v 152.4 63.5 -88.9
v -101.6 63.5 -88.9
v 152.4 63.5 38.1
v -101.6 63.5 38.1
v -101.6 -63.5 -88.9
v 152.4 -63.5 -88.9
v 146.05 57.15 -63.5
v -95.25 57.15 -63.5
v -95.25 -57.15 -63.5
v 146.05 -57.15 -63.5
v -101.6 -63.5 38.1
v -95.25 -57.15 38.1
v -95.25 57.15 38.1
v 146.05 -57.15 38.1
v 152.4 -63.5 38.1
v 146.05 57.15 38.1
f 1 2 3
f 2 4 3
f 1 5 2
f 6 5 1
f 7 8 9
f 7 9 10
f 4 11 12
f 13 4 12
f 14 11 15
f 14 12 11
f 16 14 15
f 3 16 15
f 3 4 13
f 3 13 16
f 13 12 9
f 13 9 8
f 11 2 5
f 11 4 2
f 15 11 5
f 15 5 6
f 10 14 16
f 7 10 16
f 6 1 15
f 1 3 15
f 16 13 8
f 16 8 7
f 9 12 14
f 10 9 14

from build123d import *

# Parameters (mm, degrees)
F0_W      = 254
F0_H      = 127
F1_DEPTH  = 38.1
F1_FACE_W = 254
F1_FACE_H = 127
F2_DEPTH  = 88.9
F3_W      = 241.3
F3_H      = 114.3
F4_DEPTH  = 101.6


with BuildPart() as f1:
    # F0 (on Top) → F1 (new body)
    with BuildSketch(Plane.XY):
        with Locations((25.4, 0)):
            Rectangle(F0_W, F0_H)
    extrude(amount=F1_DEPTH)

    # F1_face (on face) + F0 (on Top) → F2 (join)
    with BuildSketch(Plane(origin=(25.4, 0, 0), x_dir=(1, 0, 0), z_dir=(0, 0, -1))):
        Rectangle(F1_FACE_W, F1_FACE_H)
    with BuildSketch(Plane.XY):
        with Locations((25.4, 0)):
            Rectangle(F0_W, F0_H)
    extrude(amount=F2_DEPTH, dir=(0, 0, -1))

    # F3 (on face) → F4 (cut)
    with BuildSketch(Plane.XY.offset(38.1)):
        with Locations((25.4, 0)):
            Rectangle(F3_W, F3_H)
    extrude(amount=-F4_DEPTH, mode=Mode.SUBTRACT)


solid = f1.part
